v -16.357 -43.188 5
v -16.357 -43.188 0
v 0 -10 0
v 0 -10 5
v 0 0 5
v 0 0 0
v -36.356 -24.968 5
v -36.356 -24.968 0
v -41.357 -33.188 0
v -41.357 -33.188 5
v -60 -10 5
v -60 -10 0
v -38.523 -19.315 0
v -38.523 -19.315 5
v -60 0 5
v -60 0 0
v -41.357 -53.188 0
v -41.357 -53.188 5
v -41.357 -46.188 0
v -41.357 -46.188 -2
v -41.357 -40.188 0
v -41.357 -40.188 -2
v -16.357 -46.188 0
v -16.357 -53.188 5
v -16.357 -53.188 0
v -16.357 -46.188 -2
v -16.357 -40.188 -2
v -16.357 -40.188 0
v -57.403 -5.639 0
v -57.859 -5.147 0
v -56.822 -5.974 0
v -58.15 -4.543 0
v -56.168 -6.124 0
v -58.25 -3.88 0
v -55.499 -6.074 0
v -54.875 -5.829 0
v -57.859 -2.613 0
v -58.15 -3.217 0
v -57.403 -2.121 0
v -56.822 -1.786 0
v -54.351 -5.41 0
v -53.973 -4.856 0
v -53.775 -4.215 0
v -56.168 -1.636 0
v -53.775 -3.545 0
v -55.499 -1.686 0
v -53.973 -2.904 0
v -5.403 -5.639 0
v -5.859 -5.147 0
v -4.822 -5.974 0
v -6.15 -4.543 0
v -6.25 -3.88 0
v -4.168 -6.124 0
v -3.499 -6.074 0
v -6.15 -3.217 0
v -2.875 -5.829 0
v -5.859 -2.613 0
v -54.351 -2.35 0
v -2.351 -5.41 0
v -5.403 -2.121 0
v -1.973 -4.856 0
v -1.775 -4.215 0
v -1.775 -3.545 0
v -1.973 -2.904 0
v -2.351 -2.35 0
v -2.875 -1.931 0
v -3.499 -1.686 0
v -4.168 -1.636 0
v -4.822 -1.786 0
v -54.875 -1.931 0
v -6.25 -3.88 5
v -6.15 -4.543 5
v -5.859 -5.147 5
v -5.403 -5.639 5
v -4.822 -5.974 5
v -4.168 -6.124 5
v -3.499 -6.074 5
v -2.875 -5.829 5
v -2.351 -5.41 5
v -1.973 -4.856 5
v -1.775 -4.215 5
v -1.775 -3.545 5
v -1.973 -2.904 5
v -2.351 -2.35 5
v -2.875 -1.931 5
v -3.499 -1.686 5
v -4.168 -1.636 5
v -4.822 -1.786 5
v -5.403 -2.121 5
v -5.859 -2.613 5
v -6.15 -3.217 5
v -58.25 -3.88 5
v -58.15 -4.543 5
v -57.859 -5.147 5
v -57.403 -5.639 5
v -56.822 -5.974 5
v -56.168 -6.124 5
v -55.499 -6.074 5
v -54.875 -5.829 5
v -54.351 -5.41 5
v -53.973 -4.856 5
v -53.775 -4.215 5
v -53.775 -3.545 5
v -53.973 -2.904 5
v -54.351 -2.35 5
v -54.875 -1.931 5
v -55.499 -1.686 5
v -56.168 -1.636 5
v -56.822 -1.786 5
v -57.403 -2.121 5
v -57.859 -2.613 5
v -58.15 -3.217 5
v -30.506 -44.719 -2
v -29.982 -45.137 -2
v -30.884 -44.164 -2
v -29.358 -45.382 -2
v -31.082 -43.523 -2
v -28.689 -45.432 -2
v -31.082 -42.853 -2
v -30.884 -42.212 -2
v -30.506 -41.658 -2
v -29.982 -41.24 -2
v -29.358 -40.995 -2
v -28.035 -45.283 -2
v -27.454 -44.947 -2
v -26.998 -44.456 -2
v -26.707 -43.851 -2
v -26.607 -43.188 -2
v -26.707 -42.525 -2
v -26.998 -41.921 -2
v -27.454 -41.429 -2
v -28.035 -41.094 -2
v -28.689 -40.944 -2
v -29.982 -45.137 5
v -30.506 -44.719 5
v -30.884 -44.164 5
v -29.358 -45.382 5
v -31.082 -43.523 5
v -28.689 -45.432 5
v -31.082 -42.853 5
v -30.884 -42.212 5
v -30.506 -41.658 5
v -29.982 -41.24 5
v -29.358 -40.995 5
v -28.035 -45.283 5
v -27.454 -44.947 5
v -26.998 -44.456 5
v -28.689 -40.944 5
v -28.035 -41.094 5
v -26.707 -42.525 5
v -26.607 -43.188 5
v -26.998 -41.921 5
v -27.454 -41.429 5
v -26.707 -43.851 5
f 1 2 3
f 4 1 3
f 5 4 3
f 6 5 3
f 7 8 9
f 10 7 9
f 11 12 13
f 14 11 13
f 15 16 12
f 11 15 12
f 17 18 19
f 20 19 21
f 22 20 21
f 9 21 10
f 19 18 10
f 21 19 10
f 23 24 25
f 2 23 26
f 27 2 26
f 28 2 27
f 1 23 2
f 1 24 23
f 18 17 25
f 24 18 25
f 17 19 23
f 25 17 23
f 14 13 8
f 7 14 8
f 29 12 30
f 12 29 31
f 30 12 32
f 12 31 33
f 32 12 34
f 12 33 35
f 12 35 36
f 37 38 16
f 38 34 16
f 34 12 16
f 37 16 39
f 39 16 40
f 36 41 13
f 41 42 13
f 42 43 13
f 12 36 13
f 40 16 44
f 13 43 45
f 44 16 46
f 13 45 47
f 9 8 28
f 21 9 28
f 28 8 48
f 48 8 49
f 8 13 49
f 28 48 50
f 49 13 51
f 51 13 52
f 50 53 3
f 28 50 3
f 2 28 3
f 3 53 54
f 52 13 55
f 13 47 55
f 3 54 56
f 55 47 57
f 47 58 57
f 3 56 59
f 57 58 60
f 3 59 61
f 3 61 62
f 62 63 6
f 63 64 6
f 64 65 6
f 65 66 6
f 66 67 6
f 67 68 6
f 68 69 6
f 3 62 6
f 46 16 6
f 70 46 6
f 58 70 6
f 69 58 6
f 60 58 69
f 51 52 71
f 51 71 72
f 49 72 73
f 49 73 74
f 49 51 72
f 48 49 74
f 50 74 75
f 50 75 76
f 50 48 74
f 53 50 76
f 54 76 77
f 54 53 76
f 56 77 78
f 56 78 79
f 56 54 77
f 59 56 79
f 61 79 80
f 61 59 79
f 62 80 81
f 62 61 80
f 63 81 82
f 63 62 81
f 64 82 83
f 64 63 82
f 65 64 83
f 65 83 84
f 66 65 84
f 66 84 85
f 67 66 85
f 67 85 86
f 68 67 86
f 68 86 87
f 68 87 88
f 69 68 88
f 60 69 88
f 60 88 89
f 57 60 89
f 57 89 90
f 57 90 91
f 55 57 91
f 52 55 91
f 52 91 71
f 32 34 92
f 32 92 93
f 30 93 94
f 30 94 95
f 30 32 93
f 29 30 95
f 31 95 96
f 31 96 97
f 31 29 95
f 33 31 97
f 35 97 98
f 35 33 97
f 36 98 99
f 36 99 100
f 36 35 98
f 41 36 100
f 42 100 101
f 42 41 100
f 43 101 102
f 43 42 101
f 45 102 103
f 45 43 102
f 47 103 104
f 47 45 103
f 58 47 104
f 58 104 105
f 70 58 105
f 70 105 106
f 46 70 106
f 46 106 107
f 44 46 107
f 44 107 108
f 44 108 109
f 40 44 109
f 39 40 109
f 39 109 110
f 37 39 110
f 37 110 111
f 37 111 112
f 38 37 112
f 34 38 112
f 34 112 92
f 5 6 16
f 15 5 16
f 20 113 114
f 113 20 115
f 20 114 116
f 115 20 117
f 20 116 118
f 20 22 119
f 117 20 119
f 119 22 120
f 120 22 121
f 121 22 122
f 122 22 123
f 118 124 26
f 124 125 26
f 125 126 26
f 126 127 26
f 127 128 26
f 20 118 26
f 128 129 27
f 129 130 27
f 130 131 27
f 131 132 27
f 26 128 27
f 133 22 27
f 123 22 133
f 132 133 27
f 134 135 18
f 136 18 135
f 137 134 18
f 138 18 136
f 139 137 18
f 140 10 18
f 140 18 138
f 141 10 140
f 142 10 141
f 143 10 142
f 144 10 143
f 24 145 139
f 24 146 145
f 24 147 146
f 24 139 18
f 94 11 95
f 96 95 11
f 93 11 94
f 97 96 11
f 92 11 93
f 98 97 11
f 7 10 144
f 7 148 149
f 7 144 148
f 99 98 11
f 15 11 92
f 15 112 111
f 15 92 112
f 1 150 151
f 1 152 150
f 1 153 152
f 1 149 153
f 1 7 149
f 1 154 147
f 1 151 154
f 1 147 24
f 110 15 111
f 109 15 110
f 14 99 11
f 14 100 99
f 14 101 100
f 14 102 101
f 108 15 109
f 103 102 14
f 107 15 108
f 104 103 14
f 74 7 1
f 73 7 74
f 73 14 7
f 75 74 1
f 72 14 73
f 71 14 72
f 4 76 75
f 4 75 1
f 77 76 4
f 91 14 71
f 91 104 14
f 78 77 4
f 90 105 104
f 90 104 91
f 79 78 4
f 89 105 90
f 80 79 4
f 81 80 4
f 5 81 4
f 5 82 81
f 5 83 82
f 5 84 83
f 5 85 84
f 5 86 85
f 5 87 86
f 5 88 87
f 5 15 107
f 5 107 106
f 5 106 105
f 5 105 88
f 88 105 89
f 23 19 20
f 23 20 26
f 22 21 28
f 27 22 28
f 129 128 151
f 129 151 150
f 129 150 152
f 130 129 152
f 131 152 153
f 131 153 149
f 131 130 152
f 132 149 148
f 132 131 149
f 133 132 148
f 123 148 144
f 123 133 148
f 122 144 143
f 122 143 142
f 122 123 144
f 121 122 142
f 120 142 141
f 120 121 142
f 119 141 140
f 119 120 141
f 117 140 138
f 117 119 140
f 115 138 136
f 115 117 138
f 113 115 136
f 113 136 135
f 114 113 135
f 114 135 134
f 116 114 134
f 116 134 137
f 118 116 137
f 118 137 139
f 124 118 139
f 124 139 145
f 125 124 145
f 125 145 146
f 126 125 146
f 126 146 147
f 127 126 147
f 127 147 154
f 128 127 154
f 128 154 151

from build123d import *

# Parameters (mm, degrees)
BOSS_EXTRU_1_DEPTH      = 5
ESQUISSE2_W             = 25
ESQUISSE2_H             = 6
BOSS_EXTRU_2_DEPTH      = 2
ESQUISSE3_R             = 2.25
ENL_V_MAT_EXTRU_3_DEPTH = 8.1


with BuildPart() as part:
    # Esquisse1 → Boss.-Extru.1 (new body)
    with BuildSketch(Plane.XY):
        Polygon((0, 0), (60, 0), (60, -10), (38.522739923, -19.314739888), (36.355716988, -24.967843196), (41.356924968, -33.188115427), (41.356924968, -53.188115427), (16.356924968, -53.188115427), (16.356924968, -43.188115427), (0, -10), align=None)
    extrude(amount=BOSS_EXTRU_1_DEPTH)

    # Esquisse2 → Boss.-Extru.2 (add)
    with BuildSketch(Plane(origin=(0, 0, 0), x_dir=(-1, 0, 0), z_dir=(0, 0, -1))):
        with Locations((-28.856924968, -43.188115427)):
            Rectangle(ESQUISSE2_W, ESQUISSE2_H)
    extrude(amount=BOSS_EXTRU_2_DEPTH)

    # Esquisse3 → Enlèv. mat.-Extru.3 (cut)
    with BuildSketch(Plane(origin=(0, 0, -2), x_dir=(-1, 0, 0), z_dir=(0, 0, -1))):
        with Locations((-28.856924968, -43.188115427)):
            Circle(ESQUISSE3_R)
        with Locations(Location((-56, -3.88, 0), (0, 0, 180))):
            Circle(ESQUISSE3_R)
        with Locations(Location((-4, -3.88, 0), (0, 0, 180))):
            Circle(ESQUISSE3_R)
    extrude(amount=-ENL_V_MAT_EXTRU_3_DEPTH, mode=Mode.SUBTRACT)

    # Symétrie1: part across plane


with BuildPart() as part_1:
    add(part.part)
    add(part.part.mirror(Plane(origin=(0, 0, 5), x_dir=(0, 0, 1), z_dir=(1, 0, 0))))

    # Fractionner1
    split(bisect_by=Plane(origin=(0, 0, 0), x_dir=(0, 0, -1), z_dir=(-1, 0, 0)), keep=Keep.TOP)


solid = part_1.part
